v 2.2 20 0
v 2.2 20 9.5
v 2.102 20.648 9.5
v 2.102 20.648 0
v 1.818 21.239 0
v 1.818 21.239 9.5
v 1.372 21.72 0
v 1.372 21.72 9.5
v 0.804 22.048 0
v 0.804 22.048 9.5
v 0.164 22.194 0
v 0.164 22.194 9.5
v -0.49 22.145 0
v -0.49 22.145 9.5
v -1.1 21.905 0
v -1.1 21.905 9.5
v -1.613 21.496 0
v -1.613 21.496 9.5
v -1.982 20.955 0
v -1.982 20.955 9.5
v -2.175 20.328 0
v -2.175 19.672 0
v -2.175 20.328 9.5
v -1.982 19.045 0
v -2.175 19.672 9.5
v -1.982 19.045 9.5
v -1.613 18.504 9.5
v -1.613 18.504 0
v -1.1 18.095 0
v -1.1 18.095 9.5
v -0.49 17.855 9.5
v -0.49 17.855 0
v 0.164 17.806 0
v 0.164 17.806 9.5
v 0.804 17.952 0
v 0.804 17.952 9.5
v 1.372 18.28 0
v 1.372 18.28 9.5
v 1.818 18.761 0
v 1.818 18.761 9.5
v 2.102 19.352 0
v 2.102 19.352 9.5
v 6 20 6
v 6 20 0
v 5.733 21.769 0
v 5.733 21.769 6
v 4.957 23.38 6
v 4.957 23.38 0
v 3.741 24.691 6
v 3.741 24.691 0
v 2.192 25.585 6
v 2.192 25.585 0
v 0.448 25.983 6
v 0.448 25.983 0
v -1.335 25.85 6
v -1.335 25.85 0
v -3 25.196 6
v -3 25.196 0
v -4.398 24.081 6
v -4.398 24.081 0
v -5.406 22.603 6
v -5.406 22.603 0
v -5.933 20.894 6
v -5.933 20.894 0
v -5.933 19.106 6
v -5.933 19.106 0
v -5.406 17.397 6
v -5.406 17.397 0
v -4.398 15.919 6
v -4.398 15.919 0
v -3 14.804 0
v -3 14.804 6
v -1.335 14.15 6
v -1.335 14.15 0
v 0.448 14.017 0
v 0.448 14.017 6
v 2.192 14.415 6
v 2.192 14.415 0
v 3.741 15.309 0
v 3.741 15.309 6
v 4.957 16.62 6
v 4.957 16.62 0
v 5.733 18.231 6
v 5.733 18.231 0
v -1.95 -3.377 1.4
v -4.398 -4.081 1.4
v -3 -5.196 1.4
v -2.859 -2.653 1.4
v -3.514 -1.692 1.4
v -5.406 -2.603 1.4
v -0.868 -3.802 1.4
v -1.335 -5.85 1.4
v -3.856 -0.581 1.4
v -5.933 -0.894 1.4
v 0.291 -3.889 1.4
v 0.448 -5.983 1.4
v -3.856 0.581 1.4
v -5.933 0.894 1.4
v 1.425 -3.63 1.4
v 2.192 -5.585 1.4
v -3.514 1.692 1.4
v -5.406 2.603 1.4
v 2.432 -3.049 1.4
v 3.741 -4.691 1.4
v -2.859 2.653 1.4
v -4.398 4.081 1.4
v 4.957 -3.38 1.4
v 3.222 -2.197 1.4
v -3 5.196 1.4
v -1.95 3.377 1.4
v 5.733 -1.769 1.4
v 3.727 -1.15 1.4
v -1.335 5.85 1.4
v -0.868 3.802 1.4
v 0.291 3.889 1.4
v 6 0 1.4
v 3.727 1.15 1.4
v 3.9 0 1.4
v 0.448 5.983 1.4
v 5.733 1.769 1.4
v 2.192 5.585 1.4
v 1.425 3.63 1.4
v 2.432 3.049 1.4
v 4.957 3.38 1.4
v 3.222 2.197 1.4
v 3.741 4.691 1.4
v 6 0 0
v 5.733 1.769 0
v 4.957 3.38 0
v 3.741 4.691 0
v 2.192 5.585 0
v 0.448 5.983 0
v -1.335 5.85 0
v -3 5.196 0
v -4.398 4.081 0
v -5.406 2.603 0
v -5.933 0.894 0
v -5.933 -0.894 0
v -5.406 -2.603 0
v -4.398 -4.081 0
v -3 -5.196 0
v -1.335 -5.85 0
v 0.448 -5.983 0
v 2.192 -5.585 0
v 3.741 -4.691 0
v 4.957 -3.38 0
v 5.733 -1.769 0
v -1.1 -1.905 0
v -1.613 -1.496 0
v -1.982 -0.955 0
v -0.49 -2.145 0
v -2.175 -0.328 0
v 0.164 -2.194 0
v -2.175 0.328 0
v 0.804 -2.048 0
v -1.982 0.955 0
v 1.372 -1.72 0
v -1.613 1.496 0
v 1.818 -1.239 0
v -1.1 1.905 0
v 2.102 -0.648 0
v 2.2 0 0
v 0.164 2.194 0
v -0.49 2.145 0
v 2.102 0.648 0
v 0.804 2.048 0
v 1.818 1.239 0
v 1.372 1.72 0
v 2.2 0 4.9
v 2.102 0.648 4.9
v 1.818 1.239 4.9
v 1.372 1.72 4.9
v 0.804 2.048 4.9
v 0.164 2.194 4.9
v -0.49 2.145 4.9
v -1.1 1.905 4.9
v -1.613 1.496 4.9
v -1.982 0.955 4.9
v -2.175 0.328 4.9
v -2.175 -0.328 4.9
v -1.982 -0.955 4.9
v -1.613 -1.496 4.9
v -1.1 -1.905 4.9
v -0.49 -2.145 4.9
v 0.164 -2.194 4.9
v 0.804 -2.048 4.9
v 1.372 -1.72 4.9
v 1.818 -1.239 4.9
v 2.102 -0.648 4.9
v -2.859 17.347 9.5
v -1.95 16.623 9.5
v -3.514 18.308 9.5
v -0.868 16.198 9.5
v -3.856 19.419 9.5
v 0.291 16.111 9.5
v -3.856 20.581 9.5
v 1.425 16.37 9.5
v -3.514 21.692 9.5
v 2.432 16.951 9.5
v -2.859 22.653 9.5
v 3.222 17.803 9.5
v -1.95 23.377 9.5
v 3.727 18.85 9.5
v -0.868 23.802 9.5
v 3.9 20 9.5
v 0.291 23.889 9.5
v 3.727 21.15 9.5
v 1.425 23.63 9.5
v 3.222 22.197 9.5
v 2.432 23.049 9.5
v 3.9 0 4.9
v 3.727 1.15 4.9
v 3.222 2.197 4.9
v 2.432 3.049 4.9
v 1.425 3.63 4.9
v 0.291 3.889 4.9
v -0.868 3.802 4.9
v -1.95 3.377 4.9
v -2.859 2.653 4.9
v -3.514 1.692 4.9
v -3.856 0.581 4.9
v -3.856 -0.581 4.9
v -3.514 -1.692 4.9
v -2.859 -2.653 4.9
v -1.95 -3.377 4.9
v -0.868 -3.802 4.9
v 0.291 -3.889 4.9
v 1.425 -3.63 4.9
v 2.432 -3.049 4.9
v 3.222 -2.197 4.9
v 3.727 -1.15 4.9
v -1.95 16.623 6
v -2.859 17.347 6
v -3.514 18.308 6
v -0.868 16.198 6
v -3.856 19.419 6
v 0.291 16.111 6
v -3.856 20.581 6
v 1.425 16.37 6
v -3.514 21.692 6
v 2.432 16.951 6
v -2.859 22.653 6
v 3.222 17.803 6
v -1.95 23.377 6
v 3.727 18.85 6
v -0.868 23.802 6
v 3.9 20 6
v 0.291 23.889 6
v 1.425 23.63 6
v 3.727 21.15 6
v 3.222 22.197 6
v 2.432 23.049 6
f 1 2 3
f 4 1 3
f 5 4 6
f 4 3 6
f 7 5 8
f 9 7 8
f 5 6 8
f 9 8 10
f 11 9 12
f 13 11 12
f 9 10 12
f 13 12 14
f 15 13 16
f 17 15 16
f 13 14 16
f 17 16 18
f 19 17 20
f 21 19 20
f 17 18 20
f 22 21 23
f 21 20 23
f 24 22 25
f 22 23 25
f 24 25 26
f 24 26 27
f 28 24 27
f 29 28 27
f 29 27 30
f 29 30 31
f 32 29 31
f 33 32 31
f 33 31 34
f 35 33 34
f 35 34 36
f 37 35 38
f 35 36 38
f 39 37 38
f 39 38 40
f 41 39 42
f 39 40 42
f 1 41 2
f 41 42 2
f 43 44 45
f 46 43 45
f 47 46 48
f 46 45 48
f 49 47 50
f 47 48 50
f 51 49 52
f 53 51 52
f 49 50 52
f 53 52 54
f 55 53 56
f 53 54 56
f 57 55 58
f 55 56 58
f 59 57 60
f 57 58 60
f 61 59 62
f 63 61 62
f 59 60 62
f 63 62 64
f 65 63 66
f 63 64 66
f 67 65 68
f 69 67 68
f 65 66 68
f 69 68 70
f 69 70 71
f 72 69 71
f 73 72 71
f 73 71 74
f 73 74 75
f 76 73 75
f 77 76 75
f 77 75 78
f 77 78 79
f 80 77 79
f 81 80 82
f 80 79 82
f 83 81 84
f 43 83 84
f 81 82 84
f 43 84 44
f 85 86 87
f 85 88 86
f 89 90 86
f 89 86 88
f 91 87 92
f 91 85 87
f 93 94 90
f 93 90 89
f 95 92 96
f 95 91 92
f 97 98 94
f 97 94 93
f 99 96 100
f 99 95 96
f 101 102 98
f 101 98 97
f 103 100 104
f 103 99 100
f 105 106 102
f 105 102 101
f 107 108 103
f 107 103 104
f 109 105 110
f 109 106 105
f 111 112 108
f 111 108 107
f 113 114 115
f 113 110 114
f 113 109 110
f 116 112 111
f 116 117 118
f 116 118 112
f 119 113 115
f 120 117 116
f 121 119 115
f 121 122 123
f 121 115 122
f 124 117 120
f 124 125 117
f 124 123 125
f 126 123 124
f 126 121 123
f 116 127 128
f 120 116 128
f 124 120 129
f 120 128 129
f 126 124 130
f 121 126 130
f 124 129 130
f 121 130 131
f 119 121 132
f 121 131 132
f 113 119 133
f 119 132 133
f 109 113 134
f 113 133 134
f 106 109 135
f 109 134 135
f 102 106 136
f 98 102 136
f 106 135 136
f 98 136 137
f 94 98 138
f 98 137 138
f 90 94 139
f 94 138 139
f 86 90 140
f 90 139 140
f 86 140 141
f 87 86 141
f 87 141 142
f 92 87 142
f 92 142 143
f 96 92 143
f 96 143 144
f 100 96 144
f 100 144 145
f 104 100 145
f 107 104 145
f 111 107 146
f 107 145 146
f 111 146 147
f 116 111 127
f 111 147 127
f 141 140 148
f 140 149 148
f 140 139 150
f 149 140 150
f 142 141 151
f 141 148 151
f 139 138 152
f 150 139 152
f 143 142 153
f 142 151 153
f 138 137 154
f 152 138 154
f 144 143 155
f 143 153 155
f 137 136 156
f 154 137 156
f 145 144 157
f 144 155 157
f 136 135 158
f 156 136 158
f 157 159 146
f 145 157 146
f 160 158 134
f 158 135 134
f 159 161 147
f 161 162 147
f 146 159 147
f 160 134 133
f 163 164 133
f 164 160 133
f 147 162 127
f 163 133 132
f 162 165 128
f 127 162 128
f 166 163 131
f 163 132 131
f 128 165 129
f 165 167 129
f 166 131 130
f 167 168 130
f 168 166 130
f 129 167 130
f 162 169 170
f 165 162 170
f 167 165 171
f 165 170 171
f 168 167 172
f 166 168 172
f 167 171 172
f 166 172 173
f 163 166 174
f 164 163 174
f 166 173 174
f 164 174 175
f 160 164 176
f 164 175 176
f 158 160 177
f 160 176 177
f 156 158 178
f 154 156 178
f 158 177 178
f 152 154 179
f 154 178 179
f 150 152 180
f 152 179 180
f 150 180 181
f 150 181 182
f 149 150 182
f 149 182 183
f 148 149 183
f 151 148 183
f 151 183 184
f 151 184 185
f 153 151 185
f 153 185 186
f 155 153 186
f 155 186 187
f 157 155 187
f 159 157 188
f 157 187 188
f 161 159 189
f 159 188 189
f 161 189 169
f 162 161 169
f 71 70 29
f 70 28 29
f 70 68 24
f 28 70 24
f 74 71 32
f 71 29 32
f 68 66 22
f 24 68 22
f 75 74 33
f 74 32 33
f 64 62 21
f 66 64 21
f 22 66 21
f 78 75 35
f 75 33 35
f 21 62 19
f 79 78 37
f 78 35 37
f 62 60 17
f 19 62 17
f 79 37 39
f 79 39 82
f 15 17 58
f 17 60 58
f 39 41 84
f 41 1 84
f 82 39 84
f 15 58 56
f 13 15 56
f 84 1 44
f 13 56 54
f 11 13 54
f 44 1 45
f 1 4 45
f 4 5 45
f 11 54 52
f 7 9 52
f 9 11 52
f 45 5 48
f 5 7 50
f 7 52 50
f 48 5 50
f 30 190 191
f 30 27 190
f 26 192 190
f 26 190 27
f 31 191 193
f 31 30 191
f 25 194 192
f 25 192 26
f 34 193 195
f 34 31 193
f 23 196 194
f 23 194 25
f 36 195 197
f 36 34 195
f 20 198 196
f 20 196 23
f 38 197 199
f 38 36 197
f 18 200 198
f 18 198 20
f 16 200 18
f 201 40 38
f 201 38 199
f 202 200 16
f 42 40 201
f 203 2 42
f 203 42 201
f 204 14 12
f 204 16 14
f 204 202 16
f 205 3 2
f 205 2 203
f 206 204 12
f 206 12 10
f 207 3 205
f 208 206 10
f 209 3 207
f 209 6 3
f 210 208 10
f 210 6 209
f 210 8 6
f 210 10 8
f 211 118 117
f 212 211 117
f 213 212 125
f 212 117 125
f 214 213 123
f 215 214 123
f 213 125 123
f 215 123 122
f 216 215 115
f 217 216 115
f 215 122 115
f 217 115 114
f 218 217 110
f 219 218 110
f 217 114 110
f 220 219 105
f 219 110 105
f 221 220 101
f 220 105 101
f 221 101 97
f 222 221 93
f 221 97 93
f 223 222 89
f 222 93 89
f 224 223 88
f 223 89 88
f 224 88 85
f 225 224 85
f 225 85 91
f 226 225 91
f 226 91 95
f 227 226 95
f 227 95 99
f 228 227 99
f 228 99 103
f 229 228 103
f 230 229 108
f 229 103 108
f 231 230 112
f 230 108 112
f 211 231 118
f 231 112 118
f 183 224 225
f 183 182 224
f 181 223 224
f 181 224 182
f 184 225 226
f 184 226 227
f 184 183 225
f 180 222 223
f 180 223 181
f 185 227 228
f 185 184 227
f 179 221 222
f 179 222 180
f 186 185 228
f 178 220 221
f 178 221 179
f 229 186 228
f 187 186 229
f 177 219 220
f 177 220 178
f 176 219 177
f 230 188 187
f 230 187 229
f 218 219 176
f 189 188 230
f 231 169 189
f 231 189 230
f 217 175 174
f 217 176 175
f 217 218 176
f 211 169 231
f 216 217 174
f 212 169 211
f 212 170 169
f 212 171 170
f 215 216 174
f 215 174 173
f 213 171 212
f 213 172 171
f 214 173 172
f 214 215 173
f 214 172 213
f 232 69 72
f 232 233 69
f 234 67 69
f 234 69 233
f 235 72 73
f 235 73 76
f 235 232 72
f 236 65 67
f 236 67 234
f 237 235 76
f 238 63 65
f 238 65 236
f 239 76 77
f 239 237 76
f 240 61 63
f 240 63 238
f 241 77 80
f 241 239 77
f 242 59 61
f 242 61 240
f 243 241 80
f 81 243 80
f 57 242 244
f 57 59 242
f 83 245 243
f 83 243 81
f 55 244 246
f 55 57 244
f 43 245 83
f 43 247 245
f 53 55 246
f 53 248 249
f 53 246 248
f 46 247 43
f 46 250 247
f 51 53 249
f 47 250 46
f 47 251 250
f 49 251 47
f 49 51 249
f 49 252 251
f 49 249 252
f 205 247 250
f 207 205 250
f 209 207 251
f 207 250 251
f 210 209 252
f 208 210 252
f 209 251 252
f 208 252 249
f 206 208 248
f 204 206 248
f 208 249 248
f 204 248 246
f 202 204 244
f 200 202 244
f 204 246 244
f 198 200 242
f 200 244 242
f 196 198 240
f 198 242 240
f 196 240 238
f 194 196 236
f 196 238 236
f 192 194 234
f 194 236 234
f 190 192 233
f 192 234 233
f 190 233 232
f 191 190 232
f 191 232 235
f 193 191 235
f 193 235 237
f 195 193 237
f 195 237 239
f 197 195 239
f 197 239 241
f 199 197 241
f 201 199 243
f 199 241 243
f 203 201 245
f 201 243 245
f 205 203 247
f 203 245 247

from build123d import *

# Parameters (mm, degrees)
F0_R      = 6
F1_DEPTH  = 1.4
F2_R      = 3.9
F3_DEPTH  = 3.5
F4_R      = 2.2
F5_DEPTH  = 4.9
F6_R      = 6
F7_DEPTH  = 6
F8_R      = 3.9
F9_DEPTH  = 3.5
F10_R     = 2.2
F11_DEPTH = 9.5


with BuildPart() as f1:
    # F0 (on Top) → F1 (new body)
    with BuildSketch(Plane.XY):
        Circle(F0_R)
    extrude(amount=F1_DEPTH)

    # F2 (on face) → F3 (join)
    with BuildSketch(Plane.XY.offset(1.4)):
        Circle(F2_R)
    extrude(amount=F3_DEPTH)

    # F4 (on face) → F5 (cut, through all)
    with BuildSketch(Plane.XY.offset(4.9)):
        Circle(F4_R)
    extrude(amount=-F5_DEPTH, mode=Mode.SUBTRACT)


with BuildPart() as f7:
    # F6 (on Top) → F7 (new body)
    with BuildSketch(Plane.XY):
        with Locations((0, 20)):
            Circle(F6_R)
    extrude(amount=F7_DEPTH)

    # F8 (on face) → F9 (join)
    with BuildSketch(Plane.XY.offset(6)):
        with Locations((0, 20)):
            Circle(F8_R)
    extrude(amount=F9_DEPTH)

    # F10 (on face) → F11 (cut, through all)
    with BuildSketch(Plane.XY.offset(9.5)):
        with Locations((0, 20)):
            Circle(F10_R)
    extrude(amount=-F11_DEPTH, mode=Mode.SUBTRACT)


solid = Compound([f1.part, f7.part])
